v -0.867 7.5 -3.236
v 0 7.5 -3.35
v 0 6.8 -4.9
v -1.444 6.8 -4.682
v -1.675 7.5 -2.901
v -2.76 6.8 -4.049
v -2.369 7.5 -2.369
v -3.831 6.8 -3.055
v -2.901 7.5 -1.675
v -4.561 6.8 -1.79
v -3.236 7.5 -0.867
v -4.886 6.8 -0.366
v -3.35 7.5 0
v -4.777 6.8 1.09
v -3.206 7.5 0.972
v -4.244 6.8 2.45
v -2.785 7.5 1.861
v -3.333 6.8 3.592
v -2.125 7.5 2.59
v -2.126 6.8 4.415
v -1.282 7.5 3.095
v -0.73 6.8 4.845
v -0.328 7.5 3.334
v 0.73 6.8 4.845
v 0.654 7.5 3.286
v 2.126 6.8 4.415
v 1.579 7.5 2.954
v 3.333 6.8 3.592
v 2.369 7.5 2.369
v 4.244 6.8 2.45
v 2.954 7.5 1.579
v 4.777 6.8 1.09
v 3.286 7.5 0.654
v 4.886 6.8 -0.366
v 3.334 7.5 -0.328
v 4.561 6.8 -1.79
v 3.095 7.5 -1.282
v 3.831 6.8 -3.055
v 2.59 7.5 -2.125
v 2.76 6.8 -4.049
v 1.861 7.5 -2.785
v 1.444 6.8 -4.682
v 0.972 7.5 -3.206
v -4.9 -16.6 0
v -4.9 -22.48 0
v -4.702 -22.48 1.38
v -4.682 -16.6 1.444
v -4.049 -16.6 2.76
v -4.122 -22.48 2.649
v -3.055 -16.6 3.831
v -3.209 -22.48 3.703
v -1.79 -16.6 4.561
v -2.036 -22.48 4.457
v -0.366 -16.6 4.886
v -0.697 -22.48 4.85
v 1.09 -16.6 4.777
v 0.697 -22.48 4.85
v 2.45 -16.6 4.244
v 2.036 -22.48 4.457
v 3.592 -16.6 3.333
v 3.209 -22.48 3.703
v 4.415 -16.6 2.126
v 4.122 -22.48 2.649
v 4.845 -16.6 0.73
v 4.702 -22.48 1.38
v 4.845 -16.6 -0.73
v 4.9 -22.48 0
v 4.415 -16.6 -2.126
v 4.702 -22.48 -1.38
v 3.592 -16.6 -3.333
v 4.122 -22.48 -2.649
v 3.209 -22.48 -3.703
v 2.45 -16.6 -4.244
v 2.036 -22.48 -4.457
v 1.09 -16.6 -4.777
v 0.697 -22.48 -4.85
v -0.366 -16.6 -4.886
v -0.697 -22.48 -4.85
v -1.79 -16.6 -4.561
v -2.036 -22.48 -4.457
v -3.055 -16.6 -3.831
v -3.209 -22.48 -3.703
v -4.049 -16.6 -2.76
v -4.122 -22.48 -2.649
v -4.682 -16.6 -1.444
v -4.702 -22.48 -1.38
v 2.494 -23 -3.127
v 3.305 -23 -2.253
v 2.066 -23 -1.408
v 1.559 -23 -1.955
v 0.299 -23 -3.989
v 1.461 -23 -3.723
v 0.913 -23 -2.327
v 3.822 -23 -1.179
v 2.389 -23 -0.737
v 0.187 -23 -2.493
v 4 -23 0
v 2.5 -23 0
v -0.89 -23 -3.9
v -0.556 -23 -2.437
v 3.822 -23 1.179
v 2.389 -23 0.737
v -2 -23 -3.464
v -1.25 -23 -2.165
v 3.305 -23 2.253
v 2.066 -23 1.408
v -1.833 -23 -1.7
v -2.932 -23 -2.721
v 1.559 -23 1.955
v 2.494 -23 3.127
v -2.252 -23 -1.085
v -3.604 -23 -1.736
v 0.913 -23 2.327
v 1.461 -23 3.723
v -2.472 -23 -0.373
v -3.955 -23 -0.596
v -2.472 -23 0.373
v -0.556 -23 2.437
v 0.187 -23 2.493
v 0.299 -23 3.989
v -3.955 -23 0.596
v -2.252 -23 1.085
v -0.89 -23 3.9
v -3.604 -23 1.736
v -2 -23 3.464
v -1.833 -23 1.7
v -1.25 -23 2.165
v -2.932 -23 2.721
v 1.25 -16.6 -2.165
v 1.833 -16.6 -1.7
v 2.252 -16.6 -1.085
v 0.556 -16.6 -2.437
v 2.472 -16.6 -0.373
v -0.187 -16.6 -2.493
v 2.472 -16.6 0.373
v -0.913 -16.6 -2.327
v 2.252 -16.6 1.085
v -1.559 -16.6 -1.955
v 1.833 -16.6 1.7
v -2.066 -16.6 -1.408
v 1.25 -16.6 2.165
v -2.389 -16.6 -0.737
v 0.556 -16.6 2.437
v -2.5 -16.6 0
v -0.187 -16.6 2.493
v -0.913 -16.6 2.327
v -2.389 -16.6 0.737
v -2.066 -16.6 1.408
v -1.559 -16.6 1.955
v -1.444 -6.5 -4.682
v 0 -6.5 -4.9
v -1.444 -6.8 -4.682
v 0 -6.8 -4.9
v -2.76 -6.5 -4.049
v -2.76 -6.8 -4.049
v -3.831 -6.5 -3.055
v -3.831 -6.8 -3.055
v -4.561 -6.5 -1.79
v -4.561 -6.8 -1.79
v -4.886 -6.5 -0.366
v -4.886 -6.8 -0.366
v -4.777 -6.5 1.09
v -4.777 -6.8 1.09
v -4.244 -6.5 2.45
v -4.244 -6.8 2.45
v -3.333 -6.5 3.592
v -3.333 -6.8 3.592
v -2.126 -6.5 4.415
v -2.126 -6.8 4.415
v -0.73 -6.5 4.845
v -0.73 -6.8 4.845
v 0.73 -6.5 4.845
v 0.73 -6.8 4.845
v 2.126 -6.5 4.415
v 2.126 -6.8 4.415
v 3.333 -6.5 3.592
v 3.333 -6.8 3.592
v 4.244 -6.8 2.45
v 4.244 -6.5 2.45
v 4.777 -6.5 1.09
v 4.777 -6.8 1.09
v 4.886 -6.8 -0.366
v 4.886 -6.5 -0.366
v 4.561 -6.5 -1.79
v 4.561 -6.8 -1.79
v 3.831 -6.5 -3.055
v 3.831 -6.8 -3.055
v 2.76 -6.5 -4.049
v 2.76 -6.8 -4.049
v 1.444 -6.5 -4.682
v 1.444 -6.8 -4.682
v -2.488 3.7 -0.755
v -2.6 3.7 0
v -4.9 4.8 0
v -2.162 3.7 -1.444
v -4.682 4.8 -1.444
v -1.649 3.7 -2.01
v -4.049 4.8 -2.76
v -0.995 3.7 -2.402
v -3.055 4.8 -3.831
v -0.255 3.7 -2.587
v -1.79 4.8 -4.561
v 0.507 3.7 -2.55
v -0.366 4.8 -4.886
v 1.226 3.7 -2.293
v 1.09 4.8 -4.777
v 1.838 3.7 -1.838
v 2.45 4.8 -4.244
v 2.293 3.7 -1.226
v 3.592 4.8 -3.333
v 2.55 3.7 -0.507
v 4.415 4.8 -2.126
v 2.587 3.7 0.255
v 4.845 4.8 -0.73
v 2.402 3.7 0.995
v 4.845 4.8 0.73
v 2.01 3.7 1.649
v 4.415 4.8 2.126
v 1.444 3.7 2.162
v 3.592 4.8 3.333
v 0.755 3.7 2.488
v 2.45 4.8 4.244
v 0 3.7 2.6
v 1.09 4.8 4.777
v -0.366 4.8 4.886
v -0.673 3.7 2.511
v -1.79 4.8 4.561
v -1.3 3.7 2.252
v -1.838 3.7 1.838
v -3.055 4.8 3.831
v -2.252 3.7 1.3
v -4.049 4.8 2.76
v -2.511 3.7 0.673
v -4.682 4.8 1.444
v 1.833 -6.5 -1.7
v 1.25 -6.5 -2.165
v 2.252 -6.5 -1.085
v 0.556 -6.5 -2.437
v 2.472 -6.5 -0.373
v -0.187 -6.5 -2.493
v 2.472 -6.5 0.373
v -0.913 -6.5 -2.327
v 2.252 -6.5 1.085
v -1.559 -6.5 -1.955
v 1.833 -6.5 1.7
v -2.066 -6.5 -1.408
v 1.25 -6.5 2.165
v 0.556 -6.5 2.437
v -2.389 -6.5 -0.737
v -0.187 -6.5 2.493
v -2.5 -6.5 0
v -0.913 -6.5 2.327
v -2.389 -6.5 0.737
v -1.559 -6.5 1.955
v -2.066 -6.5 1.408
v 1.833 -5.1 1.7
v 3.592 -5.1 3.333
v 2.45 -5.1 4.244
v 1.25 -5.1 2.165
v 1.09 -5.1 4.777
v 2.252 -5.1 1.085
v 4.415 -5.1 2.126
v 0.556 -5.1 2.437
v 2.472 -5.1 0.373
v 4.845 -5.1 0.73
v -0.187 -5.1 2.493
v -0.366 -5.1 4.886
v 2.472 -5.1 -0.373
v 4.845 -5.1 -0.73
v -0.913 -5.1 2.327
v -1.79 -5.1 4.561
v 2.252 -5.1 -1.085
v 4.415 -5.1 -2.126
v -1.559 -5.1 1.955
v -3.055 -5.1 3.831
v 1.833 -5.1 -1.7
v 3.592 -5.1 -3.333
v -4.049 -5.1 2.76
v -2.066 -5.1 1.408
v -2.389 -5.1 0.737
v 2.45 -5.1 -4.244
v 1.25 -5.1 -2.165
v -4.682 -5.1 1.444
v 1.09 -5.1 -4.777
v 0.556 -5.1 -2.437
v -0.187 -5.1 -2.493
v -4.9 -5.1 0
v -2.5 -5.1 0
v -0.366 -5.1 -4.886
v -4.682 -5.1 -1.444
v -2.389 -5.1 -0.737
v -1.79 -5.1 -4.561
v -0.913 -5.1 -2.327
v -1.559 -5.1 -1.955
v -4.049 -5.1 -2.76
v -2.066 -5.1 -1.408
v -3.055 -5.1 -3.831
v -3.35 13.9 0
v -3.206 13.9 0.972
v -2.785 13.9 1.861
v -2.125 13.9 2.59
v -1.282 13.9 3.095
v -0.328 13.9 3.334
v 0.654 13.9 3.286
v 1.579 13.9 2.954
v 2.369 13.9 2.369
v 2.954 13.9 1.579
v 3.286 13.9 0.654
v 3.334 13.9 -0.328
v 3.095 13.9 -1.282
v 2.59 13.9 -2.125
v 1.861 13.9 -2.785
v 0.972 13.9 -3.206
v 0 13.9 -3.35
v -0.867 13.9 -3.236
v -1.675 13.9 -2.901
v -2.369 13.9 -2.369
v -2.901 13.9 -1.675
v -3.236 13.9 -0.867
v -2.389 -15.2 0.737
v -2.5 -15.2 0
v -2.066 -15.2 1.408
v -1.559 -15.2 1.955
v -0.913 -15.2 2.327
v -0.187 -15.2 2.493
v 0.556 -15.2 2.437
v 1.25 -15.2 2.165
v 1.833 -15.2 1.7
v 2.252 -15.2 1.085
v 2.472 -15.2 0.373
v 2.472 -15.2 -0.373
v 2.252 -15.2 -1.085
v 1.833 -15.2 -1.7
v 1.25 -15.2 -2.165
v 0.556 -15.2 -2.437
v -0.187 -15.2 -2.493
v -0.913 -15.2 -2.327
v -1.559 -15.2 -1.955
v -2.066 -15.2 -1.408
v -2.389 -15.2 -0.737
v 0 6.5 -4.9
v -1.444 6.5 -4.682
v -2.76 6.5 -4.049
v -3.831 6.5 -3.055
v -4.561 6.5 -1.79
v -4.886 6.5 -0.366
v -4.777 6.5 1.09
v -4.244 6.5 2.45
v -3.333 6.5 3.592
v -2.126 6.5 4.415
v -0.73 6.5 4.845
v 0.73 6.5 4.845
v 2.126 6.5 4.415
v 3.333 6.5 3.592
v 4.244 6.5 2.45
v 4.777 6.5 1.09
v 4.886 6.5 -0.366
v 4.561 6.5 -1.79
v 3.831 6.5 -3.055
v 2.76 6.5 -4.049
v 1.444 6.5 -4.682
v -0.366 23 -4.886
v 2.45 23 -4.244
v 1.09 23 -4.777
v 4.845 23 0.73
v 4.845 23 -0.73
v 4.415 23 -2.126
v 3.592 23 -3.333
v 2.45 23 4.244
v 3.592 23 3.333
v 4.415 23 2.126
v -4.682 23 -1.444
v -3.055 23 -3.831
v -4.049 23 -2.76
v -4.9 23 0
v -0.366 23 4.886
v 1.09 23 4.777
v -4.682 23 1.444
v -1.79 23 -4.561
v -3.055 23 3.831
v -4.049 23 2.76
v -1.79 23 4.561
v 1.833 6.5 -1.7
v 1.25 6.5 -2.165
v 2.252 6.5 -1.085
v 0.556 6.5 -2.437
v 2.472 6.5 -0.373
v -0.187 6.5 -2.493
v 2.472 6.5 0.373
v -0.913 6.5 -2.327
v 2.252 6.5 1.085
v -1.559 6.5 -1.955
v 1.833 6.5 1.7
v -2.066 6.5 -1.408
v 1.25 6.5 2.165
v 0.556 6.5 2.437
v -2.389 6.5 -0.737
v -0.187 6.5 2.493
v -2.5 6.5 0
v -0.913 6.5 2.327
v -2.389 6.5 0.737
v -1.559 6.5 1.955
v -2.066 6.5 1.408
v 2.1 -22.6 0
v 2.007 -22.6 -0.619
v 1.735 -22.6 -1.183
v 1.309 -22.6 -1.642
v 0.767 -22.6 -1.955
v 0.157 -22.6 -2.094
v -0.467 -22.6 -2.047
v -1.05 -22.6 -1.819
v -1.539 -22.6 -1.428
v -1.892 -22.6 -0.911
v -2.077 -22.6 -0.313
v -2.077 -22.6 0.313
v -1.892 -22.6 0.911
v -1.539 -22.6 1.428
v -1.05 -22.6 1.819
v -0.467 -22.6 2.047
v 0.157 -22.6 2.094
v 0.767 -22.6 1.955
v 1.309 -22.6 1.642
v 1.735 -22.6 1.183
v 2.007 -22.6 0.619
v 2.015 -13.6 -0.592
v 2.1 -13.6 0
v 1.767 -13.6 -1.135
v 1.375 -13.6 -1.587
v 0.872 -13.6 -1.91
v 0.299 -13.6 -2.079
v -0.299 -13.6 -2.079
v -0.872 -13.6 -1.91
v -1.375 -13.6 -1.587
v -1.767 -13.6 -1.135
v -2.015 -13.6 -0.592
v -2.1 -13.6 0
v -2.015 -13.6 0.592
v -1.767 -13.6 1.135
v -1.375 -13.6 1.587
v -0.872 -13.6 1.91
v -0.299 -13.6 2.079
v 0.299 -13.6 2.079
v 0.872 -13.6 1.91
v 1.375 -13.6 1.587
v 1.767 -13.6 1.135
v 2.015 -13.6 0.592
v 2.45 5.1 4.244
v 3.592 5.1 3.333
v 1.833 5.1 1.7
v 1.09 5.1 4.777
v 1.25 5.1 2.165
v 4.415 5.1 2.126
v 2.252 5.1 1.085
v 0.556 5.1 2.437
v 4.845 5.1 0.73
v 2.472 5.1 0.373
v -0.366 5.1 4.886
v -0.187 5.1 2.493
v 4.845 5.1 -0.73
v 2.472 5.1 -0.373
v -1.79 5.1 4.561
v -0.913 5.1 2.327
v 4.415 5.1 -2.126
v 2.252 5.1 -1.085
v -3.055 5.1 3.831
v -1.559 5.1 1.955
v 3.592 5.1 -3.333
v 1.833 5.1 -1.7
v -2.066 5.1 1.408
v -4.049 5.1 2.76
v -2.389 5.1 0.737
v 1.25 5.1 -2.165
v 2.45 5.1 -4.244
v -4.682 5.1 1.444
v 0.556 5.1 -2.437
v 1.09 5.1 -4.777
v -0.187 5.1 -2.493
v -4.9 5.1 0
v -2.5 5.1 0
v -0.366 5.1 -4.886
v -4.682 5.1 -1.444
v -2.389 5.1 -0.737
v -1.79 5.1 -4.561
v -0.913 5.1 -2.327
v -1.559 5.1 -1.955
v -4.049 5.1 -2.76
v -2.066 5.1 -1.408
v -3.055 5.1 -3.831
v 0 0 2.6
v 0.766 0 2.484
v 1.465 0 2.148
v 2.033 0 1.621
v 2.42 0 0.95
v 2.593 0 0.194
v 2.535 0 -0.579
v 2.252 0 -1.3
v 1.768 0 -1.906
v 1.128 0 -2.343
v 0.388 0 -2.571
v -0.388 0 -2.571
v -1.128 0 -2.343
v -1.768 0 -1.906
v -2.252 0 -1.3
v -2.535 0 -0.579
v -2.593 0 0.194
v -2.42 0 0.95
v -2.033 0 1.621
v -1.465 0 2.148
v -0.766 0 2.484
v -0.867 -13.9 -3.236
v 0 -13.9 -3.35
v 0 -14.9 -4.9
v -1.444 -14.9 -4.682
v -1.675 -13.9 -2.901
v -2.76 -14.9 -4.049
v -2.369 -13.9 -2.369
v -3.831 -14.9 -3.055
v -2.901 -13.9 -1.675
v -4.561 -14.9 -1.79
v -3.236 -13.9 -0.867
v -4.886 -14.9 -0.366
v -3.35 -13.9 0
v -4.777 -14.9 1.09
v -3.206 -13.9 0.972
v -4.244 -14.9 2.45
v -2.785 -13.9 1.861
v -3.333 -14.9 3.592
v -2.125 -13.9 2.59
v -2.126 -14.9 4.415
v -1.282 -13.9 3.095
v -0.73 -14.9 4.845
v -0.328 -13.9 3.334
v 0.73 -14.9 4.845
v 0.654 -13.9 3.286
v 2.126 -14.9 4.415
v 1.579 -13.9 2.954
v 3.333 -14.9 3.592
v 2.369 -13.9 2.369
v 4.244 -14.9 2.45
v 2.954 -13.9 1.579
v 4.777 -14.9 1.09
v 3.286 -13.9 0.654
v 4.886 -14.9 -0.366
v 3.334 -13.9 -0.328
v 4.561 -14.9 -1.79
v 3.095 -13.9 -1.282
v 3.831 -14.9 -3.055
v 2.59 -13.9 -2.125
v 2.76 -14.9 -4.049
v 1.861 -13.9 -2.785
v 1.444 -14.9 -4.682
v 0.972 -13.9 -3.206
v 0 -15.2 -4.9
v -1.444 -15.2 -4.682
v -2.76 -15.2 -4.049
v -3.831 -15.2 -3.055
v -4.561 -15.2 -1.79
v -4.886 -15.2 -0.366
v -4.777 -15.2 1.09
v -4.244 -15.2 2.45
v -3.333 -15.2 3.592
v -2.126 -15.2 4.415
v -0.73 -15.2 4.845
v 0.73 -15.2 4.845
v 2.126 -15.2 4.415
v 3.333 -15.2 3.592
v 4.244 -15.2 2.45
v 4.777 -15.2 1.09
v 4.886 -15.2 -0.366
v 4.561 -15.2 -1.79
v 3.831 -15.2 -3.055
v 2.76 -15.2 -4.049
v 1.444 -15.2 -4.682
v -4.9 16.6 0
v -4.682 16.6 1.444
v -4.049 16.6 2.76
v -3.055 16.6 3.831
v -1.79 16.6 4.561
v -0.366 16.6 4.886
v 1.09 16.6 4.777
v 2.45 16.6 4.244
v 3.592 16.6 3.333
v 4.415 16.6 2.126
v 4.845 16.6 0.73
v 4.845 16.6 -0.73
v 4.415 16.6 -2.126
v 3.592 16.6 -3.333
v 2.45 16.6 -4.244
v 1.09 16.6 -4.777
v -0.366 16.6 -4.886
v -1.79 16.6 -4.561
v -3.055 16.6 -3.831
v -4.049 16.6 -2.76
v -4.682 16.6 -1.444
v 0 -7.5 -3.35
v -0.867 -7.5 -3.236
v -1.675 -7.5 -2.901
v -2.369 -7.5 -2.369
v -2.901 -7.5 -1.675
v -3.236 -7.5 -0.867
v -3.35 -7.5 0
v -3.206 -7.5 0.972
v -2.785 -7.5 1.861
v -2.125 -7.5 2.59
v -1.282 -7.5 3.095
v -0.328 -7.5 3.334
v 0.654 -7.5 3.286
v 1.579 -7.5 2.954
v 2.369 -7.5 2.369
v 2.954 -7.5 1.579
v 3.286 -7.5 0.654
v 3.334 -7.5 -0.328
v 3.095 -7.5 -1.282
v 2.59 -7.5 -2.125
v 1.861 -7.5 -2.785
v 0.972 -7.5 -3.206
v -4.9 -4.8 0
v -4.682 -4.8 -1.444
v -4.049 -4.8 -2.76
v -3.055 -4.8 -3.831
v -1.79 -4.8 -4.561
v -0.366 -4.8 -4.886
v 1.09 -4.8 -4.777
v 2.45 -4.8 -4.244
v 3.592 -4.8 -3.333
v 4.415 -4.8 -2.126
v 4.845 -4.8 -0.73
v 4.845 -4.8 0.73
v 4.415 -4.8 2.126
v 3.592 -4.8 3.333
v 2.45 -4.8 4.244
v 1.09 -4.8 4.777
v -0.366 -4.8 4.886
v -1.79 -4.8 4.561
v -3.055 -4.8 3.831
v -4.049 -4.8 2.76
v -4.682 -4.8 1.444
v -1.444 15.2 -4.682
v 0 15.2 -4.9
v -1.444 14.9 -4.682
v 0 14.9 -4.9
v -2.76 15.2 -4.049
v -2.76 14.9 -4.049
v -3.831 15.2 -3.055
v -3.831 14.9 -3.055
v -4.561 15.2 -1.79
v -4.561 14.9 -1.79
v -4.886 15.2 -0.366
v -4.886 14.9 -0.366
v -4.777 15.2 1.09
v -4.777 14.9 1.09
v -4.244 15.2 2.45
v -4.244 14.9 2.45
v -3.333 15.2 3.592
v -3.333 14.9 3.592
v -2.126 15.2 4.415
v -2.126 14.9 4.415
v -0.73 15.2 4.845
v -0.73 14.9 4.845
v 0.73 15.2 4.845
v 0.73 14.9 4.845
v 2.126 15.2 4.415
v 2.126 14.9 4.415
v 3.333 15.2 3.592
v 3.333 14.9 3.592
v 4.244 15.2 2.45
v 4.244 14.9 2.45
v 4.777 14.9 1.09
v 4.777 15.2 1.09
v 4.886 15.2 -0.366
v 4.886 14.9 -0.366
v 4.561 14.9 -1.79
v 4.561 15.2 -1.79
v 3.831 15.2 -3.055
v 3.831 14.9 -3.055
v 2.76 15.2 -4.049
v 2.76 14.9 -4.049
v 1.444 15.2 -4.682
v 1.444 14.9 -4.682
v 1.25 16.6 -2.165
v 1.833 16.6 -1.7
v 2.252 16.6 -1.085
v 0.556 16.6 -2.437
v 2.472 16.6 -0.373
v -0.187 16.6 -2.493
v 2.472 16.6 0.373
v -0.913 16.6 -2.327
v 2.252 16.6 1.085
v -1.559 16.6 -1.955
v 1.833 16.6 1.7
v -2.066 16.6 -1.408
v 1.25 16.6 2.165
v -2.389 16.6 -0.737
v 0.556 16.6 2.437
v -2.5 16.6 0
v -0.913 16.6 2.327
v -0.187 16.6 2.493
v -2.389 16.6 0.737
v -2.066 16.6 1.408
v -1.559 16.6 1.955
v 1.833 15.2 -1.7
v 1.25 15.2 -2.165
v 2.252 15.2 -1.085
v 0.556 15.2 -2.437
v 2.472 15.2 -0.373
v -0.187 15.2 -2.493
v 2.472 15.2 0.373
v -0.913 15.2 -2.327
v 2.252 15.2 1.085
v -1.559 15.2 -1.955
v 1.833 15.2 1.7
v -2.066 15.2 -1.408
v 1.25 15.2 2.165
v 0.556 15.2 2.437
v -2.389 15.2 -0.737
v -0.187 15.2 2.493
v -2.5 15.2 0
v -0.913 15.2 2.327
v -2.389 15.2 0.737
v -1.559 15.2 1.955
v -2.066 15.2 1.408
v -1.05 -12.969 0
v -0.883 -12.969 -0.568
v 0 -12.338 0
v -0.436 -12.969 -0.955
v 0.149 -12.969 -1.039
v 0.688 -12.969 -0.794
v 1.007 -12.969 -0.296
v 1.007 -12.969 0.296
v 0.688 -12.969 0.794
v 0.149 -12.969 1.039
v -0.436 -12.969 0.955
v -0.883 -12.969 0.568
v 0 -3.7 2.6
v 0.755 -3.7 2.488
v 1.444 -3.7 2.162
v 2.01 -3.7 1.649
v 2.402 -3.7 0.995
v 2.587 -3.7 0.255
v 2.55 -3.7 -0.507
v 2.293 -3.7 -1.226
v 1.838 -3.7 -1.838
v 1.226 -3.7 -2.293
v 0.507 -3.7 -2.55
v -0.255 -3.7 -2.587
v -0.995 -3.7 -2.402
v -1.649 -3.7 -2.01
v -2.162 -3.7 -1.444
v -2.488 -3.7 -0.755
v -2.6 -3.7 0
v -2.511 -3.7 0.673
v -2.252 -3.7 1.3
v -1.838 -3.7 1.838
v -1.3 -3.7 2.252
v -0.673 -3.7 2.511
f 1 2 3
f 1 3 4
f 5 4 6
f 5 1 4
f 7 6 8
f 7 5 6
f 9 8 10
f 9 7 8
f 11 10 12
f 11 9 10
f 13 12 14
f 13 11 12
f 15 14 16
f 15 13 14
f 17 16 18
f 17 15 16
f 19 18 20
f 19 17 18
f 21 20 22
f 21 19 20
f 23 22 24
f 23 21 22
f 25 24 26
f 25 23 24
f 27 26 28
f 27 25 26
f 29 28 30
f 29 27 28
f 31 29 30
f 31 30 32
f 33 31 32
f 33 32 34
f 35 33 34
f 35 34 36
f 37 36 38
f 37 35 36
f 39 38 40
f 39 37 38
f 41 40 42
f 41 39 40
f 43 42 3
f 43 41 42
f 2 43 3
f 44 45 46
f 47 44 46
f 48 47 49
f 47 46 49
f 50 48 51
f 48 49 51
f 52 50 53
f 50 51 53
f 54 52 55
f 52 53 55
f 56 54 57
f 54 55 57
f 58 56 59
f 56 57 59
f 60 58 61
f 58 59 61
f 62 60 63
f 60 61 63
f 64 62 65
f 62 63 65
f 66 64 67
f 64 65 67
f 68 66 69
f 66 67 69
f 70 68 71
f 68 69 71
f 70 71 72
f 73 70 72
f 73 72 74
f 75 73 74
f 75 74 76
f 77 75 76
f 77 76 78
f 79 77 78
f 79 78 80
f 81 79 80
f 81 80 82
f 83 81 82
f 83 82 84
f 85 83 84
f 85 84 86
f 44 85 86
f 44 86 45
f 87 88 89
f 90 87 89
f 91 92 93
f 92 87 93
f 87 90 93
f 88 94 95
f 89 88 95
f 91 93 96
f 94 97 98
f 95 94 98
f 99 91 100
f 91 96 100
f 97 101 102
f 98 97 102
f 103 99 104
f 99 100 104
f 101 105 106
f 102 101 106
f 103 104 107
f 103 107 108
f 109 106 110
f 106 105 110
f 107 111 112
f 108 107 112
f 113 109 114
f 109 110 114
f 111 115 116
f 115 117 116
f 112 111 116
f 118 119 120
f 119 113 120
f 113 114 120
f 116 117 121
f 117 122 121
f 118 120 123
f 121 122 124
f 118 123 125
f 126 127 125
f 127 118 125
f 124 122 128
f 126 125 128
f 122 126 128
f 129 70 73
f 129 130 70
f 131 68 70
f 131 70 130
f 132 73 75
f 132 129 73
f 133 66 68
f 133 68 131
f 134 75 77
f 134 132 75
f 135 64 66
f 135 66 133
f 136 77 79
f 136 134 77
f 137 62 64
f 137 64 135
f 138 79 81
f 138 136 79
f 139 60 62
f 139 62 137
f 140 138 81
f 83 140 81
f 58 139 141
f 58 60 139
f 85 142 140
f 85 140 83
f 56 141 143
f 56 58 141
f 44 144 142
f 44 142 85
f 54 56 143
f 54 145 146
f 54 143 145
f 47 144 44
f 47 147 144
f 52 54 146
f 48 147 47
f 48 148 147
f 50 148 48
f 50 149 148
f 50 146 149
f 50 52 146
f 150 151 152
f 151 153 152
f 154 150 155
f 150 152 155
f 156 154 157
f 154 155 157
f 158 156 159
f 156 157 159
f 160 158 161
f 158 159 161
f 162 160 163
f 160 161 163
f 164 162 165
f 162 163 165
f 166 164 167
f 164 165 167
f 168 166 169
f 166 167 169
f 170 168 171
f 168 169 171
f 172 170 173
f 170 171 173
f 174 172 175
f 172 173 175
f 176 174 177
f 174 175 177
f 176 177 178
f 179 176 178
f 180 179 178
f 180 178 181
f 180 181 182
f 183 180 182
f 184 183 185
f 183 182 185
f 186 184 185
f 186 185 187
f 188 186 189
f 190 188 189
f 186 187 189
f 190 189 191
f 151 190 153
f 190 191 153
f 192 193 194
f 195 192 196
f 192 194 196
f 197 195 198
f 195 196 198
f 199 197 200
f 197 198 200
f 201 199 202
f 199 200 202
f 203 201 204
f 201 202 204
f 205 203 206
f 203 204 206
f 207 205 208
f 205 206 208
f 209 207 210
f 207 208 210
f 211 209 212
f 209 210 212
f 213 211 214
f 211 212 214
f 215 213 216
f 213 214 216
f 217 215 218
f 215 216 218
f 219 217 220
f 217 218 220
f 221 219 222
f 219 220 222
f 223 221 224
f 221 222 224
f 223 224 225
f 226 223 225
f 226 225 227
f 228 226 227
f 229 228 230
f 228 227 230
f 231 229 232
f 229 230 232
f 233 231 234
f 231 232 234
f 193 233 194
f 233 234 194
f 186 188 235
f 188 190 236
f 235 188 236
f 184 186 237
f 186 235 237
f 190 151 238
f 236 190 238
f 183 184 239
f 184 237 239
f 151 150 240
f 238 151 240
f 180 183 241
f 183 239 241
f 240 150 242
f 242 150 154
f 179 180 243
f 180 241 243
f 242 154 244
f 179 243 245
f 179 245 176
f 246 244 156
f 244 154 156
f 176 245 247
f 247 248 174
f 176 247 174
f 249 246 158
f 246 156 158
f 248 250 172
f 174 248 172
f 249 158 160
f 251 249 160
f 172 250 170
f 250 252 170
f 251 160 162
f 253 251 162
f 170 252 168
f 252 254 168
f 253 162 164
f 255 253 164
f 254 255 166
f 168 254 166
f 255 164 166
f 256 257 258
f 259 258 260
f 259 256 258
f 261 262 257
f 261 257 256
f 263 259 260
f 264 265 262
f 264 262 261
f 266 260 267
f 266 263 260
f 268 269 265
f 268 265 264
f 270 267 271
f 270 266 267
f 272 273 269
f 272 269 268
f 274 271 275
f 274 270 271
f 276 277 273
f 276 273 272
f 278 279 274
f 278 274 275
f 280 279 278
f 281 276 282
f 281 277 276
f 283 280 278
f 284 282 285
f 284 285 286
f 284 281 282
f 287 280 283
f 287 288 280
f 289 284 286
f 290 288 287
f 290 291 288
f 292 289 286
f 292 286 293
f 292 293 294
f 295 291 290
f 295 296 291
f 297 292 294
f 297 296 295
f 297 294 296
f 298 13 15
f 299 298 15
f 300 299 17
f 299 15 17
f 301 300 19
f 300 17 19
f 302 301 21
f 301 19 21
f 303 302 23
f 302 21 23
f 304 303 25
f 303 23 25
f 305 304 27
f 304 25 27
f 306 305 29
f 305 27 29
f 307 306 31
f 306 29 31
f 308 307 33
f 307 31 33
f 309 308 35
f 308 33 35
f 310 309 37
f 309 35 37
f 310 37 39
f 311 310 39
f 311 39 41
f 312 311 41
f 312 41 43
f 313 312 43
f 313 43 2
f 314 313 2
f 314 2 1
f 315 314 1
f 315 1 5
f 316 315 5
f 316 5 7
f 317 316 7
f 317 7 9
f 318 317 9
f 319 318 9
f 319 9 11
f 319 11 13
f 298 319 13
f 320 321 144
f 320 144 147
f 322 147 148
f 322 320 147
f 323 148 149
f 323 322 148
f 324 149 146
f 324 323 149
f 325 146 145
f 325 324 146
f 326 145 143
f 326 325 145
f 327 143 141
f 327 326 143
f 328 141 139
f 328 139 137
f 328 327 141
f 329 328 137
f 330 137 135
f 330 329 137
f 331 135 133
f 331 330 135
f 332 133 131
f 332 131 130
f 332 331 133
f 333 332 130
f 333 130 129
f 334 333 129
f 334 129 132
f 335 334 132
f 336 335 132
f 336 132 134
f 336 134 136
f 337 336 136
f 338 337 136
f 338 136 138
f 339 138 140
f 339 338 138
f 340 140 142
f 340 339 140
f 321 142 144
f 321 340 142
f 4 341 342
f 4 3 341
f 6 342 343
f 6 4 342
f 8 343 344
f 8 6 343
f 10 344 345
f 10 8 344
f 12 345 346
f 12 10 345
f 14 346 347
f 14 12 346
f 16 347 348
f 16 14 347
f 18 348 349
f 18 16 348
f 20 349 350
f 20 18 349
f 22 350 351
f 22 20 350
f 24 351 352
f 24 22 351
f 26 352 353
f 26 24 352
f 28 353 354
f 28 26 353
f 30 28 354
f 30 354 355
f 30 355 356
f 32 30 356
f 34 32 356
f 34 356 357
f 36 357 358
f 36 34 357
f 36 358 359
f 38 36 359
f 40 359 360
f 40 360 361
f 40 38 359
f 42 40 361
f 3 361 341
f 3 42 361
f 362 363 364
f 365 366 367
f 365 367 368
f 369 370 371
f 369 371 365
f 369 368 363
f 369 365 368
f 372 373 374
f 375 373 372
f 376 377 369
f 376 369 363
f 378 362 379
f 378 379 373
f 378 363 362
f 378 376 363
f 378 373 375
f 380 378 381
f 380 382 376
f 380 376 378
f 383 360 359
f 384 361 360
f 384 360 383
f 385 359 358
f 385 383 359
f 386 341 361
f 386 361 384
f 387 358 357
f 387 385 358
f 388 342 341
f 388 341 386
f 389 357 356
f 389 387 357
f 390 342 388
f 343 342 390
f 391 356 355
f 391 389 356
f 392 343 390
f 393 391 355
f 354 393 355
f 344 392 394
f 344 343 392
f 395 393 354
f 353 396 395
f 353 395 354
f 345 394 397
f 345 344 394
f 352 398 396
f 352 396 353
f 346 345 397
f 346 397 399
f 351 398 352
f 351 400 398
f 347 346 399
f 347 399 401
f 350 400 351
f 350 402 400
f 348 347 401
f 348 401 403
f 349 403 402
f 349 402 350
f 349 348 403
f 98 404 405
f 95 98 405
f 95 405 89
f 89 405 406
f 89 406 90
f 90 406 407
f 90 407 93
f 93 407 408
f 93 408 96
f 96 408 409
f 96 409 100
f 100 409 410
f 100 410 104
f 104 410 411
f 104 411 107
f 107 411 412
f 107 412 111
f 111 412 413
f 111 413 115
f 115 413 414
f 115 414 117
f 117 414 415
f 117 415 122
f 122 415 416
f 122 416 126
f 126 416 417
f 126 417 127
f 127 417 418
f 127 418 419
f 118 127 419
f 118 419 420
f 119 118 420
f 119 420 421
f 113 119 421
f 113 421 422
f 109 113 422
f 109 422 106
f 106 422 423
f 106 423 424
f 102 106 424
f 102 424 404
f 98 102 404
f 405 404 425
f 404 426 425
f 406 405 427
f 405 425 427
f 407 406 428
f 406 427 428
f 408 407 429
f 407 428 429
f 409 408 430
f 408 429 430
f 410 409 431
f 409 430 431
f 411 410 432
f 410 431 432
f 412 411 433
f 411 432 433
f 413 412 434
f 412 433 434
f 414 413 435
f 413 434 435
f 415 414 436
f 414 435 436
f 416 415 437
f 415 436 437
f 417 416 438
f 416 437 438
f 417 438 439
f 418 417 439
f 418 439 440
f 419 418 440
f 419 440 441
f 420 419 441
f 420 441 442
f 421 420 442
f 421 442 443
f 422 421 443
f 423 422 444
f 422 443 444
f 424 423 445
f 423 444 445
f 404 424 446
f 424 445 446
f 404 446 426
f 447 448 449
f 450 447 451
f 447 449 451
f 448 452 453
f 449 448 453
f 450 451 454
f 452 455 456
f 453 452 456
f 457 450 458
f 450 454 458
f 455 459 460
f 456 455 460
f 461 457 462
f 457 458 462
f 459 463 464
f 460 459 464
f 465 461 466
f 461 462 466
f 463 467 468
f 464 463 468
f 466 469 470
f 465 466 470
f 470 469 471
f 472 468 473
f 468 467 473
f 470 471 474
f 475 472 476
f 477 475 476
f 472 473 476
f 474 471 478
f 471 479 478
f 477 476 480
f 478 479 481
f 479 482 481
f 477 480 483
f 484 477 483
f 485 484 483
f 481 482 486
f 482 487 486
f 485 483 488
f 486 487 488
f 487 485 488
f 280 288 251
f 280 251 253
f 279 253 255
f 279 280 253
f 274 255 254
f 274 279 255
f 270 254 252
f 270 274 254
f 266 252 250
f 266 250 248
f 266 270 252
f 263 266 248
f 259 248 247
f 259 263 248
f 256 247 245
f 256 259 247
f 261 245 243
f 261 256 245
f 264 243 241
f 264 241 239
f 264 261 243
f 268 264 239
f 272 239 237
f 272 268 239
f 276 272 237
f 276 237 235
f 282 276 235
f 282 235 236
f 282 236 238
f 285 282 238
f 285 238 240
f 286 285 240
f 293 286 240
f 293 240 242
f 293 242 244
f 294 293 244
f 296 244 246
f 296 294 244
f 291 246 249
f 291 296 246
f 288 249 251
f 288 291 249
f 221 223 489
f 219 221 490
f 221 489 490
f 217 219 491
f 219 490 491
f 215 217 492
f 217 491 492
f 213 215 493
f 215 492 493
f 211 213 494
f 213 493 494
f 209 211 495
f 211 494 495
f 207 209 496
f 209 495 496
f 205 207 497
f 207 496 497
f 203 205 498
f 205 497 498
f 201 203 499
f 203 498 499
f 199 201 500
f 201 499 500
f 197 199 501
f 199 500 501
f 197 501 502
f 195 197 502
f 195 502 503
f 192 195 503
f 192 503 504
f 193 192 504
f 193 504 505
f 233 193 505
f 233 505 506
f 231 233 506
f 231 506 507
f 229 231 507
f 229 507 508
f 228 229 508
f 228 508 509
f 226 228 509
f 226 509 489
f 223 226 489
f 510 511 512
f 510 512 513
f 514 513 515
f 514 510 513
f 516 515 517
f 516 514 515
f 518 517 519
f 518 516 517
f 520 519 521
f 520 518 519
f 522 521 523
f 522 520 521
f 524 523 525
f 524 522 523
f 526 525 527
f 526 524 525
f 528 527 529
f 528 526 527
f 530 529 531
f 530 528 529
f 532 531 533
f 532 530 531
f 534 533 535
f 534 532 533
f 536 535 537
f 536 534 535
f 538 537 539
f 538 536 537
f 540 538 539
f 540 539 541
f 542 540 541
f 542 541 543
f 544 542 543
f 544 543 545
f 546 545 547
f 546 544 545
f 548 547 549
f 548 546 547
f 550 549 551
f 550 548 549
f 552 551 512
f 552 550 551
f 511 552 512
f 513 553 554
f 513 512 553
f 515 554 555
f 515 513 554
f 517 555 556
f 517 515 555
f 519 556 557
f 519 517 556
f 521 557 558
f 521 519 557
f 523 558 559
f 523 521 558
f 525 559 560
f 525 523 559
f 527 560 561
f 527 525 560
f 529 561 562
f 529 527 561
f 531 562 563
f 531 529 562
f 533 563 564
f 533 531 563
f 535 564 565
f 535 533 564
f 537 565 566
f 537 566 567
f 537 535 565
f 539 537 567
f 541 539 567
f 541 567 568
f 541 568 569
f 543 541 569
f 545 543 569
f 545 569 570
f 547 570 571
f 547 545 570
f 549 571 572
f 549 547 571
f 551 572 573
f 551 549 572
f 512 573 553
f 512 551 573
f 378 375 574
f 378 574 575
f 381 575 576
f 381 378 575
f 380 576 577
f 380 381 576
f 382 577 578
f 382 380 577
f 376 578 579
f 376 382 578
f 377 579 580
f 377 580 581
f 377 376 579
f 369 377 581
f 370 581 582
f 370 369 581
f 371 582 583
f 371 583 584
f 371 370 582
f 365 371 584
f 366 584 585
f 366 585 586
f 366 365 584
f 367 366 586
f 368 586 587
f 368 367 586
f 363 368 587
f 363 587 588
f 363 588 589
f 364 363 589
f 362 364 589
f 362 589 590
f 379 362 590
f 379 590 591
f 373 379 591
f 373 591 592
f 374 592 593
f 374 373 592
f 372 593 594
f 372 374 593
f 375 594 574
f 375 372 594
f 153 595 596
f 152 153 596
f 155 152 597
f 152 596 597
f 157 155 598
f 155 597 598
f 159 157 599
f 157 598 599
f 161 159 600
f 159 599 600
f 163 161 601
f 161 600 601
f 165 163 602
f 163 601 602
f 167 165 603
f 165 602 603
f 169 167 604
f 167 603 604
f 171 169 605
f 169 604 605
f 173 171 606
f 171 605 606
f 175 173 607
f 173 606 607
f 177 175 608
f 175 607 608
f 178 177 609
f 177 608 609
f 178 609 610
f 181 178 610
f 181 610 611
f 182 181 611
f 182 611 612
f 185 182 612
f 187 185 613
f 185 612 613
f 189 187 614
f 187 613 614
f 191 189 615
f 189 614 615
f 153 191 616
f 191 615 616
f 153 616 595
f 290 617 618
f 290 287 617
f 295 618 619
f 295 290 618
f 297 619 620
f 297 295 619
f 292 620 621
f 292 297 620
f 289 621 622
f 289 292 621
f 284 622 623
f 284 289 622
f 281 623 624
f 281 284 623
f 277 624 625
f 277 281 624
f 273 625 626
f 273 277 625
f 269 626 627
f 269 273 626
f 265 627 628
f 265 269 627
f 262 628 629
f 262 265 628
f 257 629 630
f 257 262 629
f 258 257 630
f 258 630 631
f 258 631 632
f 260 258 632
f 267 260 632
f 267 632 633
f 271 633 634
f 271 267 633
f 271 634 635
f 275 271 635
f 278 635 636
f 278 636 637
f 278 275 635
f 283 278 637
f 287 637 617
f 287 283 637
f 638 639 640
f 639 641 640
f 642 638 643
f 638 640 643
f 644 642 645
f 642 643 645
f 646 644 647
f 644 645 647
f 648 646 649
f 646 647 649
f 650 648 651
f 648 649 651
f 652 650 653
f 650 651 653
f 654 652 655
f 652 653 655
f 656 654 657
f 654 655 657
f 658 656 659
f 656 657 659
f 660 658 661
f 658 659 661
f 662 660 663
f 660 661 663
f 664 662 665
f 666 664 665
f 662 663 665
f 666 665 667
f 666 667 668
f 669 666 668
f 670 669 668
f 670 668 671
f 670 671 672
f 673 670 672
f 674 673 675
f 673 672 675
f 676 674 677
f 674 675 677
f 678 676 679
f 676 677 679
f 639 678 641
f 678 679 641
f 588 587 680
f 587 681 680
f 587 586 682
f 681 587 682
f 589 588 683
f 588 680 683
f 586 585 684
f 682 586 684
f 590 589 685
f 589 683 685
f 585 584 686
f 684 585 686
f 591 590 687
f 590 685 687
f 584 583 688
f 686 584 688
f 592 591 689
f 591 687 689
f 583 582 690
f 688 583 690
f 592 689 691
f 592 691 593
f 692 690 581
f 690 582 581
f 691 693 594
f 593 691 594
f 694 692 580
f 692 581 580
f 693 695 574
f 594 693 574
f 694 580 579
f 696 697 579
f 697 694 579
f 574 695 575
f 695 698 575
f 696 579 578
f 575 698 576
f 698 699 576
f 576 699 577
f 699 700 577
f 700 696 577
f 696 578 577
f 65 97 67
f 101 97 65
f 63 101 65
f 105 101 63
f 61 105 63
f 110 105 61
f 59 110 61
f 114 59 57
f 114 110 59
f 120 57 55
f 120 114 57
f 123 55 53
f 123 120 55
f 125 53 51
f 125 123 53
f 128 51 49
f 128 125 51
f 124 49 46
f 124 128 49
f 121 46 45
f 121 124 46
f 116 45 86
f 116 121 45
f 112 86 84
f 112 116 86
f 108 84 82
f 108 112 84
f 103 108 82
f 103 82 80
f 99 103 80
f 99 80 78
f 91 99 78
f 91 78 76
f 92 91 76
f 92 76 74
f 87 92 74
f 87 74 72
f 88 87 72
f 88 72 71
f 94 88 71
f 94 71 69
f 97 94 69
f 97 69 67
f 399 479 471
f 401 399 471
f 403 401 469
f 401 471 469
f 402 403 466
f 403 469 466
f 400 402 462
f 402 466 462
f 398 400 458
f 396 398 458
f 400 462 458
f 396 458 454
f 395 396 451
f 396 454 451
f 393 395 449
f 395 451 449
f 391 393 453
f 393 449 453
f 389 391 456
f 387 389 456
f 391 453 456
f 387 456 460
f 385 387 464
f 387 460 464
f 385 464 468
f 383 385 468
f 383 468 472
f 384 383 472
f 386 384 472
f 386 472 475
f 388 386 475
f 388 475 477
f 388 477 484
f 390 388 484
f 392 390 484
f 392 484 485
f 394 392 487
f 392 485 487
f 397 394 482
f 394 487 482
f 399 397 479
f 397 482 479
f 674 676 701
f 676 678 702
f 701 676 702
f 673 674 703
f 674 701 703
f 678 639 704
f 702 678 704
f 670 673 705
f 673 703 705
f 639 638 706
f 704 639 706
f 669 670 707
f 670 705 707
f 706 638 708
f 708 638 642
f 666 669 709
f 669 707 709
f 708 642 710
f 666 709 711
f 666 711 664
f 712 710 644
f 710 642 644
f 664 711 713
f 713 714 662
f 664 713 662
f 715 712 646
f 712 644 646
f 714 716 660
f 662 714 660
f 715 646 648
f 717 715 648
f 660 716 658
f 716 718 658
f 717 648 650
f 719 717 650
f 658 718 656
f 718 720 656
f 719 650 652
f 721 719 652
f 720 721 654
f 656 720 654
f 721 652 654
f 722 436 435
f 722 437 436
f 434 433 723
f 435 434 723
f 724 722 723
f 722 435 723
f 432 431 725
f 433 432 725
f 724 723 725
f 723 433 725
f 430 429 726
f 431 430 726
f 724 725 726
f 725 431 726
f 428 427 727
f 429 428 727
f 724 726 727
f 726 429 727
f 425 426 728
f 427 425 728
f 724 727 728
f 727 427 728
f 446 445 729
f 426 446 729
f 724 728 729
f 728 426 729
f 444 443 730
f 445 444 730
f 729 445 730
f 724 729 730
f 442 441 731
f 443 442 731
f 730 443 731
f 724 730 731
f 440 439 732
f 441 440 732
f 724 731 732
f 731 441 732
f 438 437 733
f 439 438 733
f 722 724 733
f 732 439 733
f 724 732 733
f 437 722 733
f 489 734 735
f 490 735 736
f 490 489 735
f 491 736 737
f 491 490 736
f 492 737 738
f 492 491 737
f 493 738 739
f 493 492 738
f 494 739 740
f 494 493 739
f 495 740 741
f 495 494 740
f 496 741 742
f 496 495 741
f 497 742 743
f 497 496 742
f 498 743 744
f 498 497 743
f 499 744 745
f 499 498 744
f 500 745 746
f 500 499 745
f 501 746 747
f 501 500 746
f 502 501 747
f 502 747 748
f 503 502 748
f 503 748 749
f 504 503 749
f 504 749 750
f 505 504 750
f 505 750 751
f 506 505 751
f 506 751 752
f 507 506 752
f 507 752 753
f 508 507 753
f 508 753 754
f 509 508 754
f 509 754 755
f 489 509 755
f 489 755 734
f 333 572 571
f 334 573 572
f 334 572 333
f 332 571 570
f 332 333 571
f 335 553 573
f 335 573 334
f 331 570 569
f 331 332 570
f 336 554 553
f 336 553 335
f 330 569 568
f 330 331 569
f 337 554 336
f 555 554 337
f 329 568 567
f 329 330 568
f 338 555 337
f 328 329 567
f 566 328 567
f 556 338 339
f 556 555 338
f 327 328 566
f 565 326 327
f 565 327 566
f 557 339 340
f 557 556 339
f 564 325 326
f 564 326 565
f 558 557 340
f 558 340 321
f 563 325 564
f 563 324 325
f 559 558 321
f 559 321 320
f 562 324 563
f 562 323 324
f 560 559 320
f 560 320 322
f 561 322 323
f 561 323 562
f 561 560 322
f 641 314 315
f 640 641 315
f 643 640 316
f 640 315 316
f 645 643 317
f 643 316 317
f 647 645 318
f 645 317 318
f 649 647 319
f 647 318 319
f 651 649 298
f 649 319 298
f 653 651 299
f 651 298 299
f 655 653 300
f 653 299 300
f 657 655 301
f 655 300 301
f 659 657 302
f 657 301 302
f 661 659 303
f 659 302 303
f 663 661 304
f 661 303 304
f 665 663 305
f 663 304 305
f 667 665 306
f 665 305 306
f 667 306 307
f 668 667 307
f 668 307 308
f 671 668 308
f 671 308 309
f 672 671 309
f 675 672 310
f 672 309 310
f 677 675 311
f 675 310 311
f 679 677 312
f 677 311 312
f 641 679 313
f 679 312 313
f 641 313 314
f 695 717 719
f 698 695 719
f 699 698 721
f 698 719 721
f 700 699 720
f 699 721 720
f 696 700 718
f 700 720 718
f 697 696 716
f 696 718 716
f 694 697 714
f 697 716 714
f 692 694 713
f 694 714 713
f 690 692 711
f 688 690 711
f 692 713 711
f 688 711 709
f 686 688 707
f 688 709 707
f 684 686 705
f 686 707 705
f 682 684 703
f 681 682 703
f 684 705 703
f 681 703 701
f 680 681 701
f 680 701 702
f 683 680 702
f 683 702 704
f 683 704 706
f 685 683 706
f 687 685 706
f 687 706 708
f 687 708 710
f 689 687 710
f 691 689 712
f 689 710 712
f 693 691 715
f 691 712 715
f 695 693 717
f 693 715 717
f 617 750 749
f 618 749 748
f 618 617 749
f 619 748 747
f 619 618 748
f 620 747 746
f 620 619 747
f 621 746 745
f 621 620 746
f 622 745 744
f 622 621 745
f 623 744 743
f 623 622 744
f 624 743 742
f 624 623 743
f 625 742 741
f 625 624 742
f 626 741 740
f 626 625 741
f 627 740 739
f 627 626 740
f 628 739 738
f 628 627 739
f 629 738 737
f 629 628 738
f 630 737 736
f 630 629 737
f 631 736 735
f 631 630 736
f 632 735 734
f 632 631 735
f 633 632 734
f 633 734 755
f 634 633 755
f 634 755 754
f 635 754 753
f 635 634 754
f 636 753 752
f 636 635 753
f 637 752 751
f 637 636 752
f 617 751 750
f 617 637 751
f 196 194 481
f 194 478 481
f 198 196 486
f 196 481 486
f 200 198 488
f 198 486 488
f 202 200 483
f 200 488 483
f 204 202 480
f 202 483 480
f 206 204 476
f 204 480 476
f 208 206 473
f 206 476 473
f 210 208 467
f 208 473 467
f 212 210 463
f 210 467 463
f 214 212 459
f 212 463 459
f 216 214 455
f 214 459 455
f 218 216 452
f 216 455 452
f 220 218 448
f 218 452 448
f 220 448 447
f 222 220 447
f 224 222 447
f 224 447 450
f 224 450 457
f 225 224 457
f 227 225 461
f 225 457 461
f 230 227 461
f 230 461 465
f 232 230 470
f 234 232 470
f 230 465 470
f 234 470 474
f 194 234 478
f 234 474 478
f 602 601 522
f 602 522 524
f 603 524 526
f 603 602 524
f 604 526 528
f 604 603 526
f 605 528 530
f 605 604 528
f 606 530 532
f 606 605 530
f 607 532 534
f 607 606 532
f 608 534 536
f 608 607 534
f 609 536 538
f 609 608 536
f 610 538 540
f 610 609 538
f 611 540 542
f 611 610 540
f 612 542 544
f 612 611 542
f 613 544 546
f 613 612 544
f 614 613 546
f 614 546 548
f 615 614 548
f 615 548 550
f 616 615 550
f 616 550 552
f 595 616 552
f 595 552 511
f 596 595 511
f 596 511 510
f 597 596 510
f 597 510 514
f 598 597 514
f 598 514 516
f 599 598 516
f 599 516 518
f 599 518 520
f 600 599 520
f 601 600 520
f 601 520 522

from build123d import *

# Parameters (mm, degrees)
MIDBODYS_R                           = 2.6
MIDBODY_DEPTH                        = 3.7
MIDORINGBODYS_R                      = 2.5
MIDORINGBODY_DEPTH                   = 1.4
EXTENDEDMIDBODYS_R                   = 3.35
EXTENDEDMIDBODY_DEPTH                = 6.4
ENDORINGBODYS_R                      = 2.5
ENDORINGBODY_DEPTH                   = 1.4
ENDBODY_START                        = 6.4
ENDBODYS_R                           = 4.9
ENDBODY_DEPTH                        = 6.4
F_4_2_4_2_DIAMETER_HOLE1_D           = 4.2
F_4_2_4_2_DIAMETER_HOLE1_DEPTH       = 9.4
F_4_2_4_2_DIAMETER_HOLE1_CSINK_D     = 5
F_4_2_4_2_DIAMETER_HOLE1_CSINK_ANGLE = 90
F_4_2_4_2_DIAMETER_HOLE1_TIP         = 1.2618073
CHAMFERS_OUTSIDE_W                   = 186.02
CHAMFERS_OUTSIDE_H                   = 186.02
CHAMFERS_OUTSIDE_R                   = 4
CHAMFER_2_DEPTH                      = 47.519028365
CHAMFER_2_DRAFT                      = -60


with BuildPart() as part:
    # MidBodyS → MidBody (new body)
    with BuildSketch(Plane(origin=(0, 0, 0), x_dir=(1, 0, 0), z_dir=(0, 1, 0))):
        with Locations(Location((0, 0, 0), (0, 0, 270))):
            Circle(MIDBODYS_R)
    midbody = extrude(amount=MIDBODY_DEPTH)

    # MidORingBaseS → MidORingBase (revolve)
    with BuildSketch(Plane.XY, mode=Mode.PRIVATE) as midoringbase_sk:
        Polygon((2.6, 3.7), (4.9, 4.8), (4.9, 5.1), (0, 5.1), (0, 3.7), align=None)
    midoringbase = revolve(midoringbase_sk.sketch.rotate(Axis((0, 5.1, 0), (0, -1, 0)), 180), axis=Axis((0, 5.1, 0), (0, -1, 0)))

    # MidORingBodyS → MidORingBody (add)
    with BuildSketch(Plane(origin=(0, 5.1, 0), x_dir=(1, 0, 0), z_dir=(0, 1, 0))):
        with Locations(Location((0, 0, 0), (0, 0, 180))):
            Circle(MIDORINGBODYS_R)
    midoringbody = extrude(amount=MIDORINGBODY_DEPTH)

    # MidORingTopBaseS → MidORingTopBase (revolve)
    with BuildSketch(Plane.XY, mode=Mode.PRIVATE) as midoringtopbase_sk:
        Polygon((0, 6.5), (4.9, 6.5), (4.9, 6.8), (3.35, 7.5), (0, 7.5), align=None)
    midoringtopbase = revolve(midoringtopbase_sk.sketch.rotate(Axis((0, 6.5, 0), (0, 1, 0)), 90), axis=Axis((0, 6.5, 0), (0, 1, 0)))

    # ExtendedMidBodyS → ExtendedMidBody (add)
    with BuildSketch(Plane(origin=(0, 7.5, 0), x_dir=(1, 0, 0), z_dir=(0, 1, 0))):
        with Locations(Location((0, 0, 0), (0, 0, 180))):
            Circle(EXTENDEDMIDBODYS_R)
    extendedmidbody = extrude(amount=EXTENDEDMIDBODY_DEPTH)

    # EndORingBaseS → EndORingBase (revolve)
    with BuildSketch(Plane.XY, mode=Mode.PRIVATE) as endoringbase_sk:
        Polygon((0, 15.2), (4.9, 15.2), (4.9, 14.9), (3.35, 13.9), (0, 13.9), align=None)
    endoringbase = revolve(endoringbase_sk.sketch.rotate(Axis((0, 13.9, 0), (0, 1, 0)), 90), axis=Axis((0, 13.9, 0), (0, 1, 0)))

    # EndORingBodyS → EndORingBody (add)
    with BuildSketch(Plane(origin=(0, 15.2, 0), x_dir=(1, 0, 0), z_dir=(0, 1, 0))):
        with Locations(Location((0, 0, 0), (0, 0, 180))):
            Circle(ENDORINGBODYS_R)
    endoringbody = extrude(amount=ENDORINGBODY_DEPTH)

    # EndBodyS → EndBody (add)
    with BuildSketch(Plane(origin=(0, 16.6, 0), x_dir=(1, 0, 0), z_dir=(0, 1, 0)).offset(ENDBODY_START)):
        with Locations(Location((0, 0, 0), (0, 0, 180))):
            Circle(ENDBODYS_R)
    endbody = extrude(amount=-ENDBODY_DEPTH)

    # HalfBodyVM: MidBody, MidORingBase, MidORingBody, MidORingTopBase, ExtendedMidBody, EndORingBase, EndORingBody, EndBody across plane
    add(midbody.mirror(Plane.ZX))
    add(midoringbase.mirror(Plane.ZX))
    add(midoringbody.mirror(Plane.ZX))
    add(midoringtopbase.mirror(Plane.ZX))
    add(extendedmidbody.mirror(Plane.ZX))
    add(endoringbase.mirror(Plane.ZX))
    add(endoringbody.mirror(Plane.ZX))
    add(endbody.mirror(Plane.ZX))

    # Ø4.2 (4.2) Diameter Hole1
    with Locations(Plane(origin=(0, -23, 0), x_dir=(-1, 0, 0), z_dir=(0, -1, 0))):
        with Locations((0, 0)):
            CounterSinkHole(F_4_2_4_2_DIAMETER_HOLE1_D / 2, F_4_2_4_2_DIAMETER_HOLE1_CSINK_D / 2, depth=F_4_2_4_2_DIAMETER_HOLE1_DEPTH, counter_sink_angle=F_4_2_4_2_DIAMETER_HOLE1_CSINK_ANGLE)
            with Locations((0, 0, -(F_4_2_4_2_DIAMETER_HOLE1_DEPTH + F_4_2_4_2_DIAMETER_HOLE1_TIP / 2))):  # 118° drill point
                Cone(0, F_4_2_4_2_DIAMETER_HOLE1_D / 2, F_4_2_4_2_DIAMETER_HOLE1_TIP, mode=Mode.SUBTRACT)


with BuildPart() as chamfer_2_tool:
    # ChamferS outside → Chamfer 2 (with draft: the straight prism first)
    with BuildSketch(Plane.XZ.offset(23)):
        Rectangle(CHAMFERS_OUTSIDE_W, CHAMFERS_OUTSIDE_H)
        Circle(CHAMFERS_OUTSIDE_R, mode=Mode.SUBTRACT)
    extrude(amount=-CHAMFER_2_DEPTH)
    # Chamfer 2: the draft: its side faces are tilted about the plane it starts from
    chamfer_2_sides = [chamfer_2_tool.faces().sort_by_distance(p)[0] for p in [
        (0, 0.759514182, -93.01),
        (93.01, 0.759514182, 0),
        (0, 0.759514182, 93.01),
        (-93.01, 0.759514182, 0),
        (-4, 0.759514182, 0),
    ]]
    draft(chamfer_2_sides, Plane.XZ.offset(23), CHAMFER_2_DRAFT)


with BuildPart() as part_1:
    add(part.part)

    # Chamfer 2: cut by chamfer_2_tool
    add(chamfer_2_tool.part, mode=Mode.SUBTRACT)


solid = part_1.part
